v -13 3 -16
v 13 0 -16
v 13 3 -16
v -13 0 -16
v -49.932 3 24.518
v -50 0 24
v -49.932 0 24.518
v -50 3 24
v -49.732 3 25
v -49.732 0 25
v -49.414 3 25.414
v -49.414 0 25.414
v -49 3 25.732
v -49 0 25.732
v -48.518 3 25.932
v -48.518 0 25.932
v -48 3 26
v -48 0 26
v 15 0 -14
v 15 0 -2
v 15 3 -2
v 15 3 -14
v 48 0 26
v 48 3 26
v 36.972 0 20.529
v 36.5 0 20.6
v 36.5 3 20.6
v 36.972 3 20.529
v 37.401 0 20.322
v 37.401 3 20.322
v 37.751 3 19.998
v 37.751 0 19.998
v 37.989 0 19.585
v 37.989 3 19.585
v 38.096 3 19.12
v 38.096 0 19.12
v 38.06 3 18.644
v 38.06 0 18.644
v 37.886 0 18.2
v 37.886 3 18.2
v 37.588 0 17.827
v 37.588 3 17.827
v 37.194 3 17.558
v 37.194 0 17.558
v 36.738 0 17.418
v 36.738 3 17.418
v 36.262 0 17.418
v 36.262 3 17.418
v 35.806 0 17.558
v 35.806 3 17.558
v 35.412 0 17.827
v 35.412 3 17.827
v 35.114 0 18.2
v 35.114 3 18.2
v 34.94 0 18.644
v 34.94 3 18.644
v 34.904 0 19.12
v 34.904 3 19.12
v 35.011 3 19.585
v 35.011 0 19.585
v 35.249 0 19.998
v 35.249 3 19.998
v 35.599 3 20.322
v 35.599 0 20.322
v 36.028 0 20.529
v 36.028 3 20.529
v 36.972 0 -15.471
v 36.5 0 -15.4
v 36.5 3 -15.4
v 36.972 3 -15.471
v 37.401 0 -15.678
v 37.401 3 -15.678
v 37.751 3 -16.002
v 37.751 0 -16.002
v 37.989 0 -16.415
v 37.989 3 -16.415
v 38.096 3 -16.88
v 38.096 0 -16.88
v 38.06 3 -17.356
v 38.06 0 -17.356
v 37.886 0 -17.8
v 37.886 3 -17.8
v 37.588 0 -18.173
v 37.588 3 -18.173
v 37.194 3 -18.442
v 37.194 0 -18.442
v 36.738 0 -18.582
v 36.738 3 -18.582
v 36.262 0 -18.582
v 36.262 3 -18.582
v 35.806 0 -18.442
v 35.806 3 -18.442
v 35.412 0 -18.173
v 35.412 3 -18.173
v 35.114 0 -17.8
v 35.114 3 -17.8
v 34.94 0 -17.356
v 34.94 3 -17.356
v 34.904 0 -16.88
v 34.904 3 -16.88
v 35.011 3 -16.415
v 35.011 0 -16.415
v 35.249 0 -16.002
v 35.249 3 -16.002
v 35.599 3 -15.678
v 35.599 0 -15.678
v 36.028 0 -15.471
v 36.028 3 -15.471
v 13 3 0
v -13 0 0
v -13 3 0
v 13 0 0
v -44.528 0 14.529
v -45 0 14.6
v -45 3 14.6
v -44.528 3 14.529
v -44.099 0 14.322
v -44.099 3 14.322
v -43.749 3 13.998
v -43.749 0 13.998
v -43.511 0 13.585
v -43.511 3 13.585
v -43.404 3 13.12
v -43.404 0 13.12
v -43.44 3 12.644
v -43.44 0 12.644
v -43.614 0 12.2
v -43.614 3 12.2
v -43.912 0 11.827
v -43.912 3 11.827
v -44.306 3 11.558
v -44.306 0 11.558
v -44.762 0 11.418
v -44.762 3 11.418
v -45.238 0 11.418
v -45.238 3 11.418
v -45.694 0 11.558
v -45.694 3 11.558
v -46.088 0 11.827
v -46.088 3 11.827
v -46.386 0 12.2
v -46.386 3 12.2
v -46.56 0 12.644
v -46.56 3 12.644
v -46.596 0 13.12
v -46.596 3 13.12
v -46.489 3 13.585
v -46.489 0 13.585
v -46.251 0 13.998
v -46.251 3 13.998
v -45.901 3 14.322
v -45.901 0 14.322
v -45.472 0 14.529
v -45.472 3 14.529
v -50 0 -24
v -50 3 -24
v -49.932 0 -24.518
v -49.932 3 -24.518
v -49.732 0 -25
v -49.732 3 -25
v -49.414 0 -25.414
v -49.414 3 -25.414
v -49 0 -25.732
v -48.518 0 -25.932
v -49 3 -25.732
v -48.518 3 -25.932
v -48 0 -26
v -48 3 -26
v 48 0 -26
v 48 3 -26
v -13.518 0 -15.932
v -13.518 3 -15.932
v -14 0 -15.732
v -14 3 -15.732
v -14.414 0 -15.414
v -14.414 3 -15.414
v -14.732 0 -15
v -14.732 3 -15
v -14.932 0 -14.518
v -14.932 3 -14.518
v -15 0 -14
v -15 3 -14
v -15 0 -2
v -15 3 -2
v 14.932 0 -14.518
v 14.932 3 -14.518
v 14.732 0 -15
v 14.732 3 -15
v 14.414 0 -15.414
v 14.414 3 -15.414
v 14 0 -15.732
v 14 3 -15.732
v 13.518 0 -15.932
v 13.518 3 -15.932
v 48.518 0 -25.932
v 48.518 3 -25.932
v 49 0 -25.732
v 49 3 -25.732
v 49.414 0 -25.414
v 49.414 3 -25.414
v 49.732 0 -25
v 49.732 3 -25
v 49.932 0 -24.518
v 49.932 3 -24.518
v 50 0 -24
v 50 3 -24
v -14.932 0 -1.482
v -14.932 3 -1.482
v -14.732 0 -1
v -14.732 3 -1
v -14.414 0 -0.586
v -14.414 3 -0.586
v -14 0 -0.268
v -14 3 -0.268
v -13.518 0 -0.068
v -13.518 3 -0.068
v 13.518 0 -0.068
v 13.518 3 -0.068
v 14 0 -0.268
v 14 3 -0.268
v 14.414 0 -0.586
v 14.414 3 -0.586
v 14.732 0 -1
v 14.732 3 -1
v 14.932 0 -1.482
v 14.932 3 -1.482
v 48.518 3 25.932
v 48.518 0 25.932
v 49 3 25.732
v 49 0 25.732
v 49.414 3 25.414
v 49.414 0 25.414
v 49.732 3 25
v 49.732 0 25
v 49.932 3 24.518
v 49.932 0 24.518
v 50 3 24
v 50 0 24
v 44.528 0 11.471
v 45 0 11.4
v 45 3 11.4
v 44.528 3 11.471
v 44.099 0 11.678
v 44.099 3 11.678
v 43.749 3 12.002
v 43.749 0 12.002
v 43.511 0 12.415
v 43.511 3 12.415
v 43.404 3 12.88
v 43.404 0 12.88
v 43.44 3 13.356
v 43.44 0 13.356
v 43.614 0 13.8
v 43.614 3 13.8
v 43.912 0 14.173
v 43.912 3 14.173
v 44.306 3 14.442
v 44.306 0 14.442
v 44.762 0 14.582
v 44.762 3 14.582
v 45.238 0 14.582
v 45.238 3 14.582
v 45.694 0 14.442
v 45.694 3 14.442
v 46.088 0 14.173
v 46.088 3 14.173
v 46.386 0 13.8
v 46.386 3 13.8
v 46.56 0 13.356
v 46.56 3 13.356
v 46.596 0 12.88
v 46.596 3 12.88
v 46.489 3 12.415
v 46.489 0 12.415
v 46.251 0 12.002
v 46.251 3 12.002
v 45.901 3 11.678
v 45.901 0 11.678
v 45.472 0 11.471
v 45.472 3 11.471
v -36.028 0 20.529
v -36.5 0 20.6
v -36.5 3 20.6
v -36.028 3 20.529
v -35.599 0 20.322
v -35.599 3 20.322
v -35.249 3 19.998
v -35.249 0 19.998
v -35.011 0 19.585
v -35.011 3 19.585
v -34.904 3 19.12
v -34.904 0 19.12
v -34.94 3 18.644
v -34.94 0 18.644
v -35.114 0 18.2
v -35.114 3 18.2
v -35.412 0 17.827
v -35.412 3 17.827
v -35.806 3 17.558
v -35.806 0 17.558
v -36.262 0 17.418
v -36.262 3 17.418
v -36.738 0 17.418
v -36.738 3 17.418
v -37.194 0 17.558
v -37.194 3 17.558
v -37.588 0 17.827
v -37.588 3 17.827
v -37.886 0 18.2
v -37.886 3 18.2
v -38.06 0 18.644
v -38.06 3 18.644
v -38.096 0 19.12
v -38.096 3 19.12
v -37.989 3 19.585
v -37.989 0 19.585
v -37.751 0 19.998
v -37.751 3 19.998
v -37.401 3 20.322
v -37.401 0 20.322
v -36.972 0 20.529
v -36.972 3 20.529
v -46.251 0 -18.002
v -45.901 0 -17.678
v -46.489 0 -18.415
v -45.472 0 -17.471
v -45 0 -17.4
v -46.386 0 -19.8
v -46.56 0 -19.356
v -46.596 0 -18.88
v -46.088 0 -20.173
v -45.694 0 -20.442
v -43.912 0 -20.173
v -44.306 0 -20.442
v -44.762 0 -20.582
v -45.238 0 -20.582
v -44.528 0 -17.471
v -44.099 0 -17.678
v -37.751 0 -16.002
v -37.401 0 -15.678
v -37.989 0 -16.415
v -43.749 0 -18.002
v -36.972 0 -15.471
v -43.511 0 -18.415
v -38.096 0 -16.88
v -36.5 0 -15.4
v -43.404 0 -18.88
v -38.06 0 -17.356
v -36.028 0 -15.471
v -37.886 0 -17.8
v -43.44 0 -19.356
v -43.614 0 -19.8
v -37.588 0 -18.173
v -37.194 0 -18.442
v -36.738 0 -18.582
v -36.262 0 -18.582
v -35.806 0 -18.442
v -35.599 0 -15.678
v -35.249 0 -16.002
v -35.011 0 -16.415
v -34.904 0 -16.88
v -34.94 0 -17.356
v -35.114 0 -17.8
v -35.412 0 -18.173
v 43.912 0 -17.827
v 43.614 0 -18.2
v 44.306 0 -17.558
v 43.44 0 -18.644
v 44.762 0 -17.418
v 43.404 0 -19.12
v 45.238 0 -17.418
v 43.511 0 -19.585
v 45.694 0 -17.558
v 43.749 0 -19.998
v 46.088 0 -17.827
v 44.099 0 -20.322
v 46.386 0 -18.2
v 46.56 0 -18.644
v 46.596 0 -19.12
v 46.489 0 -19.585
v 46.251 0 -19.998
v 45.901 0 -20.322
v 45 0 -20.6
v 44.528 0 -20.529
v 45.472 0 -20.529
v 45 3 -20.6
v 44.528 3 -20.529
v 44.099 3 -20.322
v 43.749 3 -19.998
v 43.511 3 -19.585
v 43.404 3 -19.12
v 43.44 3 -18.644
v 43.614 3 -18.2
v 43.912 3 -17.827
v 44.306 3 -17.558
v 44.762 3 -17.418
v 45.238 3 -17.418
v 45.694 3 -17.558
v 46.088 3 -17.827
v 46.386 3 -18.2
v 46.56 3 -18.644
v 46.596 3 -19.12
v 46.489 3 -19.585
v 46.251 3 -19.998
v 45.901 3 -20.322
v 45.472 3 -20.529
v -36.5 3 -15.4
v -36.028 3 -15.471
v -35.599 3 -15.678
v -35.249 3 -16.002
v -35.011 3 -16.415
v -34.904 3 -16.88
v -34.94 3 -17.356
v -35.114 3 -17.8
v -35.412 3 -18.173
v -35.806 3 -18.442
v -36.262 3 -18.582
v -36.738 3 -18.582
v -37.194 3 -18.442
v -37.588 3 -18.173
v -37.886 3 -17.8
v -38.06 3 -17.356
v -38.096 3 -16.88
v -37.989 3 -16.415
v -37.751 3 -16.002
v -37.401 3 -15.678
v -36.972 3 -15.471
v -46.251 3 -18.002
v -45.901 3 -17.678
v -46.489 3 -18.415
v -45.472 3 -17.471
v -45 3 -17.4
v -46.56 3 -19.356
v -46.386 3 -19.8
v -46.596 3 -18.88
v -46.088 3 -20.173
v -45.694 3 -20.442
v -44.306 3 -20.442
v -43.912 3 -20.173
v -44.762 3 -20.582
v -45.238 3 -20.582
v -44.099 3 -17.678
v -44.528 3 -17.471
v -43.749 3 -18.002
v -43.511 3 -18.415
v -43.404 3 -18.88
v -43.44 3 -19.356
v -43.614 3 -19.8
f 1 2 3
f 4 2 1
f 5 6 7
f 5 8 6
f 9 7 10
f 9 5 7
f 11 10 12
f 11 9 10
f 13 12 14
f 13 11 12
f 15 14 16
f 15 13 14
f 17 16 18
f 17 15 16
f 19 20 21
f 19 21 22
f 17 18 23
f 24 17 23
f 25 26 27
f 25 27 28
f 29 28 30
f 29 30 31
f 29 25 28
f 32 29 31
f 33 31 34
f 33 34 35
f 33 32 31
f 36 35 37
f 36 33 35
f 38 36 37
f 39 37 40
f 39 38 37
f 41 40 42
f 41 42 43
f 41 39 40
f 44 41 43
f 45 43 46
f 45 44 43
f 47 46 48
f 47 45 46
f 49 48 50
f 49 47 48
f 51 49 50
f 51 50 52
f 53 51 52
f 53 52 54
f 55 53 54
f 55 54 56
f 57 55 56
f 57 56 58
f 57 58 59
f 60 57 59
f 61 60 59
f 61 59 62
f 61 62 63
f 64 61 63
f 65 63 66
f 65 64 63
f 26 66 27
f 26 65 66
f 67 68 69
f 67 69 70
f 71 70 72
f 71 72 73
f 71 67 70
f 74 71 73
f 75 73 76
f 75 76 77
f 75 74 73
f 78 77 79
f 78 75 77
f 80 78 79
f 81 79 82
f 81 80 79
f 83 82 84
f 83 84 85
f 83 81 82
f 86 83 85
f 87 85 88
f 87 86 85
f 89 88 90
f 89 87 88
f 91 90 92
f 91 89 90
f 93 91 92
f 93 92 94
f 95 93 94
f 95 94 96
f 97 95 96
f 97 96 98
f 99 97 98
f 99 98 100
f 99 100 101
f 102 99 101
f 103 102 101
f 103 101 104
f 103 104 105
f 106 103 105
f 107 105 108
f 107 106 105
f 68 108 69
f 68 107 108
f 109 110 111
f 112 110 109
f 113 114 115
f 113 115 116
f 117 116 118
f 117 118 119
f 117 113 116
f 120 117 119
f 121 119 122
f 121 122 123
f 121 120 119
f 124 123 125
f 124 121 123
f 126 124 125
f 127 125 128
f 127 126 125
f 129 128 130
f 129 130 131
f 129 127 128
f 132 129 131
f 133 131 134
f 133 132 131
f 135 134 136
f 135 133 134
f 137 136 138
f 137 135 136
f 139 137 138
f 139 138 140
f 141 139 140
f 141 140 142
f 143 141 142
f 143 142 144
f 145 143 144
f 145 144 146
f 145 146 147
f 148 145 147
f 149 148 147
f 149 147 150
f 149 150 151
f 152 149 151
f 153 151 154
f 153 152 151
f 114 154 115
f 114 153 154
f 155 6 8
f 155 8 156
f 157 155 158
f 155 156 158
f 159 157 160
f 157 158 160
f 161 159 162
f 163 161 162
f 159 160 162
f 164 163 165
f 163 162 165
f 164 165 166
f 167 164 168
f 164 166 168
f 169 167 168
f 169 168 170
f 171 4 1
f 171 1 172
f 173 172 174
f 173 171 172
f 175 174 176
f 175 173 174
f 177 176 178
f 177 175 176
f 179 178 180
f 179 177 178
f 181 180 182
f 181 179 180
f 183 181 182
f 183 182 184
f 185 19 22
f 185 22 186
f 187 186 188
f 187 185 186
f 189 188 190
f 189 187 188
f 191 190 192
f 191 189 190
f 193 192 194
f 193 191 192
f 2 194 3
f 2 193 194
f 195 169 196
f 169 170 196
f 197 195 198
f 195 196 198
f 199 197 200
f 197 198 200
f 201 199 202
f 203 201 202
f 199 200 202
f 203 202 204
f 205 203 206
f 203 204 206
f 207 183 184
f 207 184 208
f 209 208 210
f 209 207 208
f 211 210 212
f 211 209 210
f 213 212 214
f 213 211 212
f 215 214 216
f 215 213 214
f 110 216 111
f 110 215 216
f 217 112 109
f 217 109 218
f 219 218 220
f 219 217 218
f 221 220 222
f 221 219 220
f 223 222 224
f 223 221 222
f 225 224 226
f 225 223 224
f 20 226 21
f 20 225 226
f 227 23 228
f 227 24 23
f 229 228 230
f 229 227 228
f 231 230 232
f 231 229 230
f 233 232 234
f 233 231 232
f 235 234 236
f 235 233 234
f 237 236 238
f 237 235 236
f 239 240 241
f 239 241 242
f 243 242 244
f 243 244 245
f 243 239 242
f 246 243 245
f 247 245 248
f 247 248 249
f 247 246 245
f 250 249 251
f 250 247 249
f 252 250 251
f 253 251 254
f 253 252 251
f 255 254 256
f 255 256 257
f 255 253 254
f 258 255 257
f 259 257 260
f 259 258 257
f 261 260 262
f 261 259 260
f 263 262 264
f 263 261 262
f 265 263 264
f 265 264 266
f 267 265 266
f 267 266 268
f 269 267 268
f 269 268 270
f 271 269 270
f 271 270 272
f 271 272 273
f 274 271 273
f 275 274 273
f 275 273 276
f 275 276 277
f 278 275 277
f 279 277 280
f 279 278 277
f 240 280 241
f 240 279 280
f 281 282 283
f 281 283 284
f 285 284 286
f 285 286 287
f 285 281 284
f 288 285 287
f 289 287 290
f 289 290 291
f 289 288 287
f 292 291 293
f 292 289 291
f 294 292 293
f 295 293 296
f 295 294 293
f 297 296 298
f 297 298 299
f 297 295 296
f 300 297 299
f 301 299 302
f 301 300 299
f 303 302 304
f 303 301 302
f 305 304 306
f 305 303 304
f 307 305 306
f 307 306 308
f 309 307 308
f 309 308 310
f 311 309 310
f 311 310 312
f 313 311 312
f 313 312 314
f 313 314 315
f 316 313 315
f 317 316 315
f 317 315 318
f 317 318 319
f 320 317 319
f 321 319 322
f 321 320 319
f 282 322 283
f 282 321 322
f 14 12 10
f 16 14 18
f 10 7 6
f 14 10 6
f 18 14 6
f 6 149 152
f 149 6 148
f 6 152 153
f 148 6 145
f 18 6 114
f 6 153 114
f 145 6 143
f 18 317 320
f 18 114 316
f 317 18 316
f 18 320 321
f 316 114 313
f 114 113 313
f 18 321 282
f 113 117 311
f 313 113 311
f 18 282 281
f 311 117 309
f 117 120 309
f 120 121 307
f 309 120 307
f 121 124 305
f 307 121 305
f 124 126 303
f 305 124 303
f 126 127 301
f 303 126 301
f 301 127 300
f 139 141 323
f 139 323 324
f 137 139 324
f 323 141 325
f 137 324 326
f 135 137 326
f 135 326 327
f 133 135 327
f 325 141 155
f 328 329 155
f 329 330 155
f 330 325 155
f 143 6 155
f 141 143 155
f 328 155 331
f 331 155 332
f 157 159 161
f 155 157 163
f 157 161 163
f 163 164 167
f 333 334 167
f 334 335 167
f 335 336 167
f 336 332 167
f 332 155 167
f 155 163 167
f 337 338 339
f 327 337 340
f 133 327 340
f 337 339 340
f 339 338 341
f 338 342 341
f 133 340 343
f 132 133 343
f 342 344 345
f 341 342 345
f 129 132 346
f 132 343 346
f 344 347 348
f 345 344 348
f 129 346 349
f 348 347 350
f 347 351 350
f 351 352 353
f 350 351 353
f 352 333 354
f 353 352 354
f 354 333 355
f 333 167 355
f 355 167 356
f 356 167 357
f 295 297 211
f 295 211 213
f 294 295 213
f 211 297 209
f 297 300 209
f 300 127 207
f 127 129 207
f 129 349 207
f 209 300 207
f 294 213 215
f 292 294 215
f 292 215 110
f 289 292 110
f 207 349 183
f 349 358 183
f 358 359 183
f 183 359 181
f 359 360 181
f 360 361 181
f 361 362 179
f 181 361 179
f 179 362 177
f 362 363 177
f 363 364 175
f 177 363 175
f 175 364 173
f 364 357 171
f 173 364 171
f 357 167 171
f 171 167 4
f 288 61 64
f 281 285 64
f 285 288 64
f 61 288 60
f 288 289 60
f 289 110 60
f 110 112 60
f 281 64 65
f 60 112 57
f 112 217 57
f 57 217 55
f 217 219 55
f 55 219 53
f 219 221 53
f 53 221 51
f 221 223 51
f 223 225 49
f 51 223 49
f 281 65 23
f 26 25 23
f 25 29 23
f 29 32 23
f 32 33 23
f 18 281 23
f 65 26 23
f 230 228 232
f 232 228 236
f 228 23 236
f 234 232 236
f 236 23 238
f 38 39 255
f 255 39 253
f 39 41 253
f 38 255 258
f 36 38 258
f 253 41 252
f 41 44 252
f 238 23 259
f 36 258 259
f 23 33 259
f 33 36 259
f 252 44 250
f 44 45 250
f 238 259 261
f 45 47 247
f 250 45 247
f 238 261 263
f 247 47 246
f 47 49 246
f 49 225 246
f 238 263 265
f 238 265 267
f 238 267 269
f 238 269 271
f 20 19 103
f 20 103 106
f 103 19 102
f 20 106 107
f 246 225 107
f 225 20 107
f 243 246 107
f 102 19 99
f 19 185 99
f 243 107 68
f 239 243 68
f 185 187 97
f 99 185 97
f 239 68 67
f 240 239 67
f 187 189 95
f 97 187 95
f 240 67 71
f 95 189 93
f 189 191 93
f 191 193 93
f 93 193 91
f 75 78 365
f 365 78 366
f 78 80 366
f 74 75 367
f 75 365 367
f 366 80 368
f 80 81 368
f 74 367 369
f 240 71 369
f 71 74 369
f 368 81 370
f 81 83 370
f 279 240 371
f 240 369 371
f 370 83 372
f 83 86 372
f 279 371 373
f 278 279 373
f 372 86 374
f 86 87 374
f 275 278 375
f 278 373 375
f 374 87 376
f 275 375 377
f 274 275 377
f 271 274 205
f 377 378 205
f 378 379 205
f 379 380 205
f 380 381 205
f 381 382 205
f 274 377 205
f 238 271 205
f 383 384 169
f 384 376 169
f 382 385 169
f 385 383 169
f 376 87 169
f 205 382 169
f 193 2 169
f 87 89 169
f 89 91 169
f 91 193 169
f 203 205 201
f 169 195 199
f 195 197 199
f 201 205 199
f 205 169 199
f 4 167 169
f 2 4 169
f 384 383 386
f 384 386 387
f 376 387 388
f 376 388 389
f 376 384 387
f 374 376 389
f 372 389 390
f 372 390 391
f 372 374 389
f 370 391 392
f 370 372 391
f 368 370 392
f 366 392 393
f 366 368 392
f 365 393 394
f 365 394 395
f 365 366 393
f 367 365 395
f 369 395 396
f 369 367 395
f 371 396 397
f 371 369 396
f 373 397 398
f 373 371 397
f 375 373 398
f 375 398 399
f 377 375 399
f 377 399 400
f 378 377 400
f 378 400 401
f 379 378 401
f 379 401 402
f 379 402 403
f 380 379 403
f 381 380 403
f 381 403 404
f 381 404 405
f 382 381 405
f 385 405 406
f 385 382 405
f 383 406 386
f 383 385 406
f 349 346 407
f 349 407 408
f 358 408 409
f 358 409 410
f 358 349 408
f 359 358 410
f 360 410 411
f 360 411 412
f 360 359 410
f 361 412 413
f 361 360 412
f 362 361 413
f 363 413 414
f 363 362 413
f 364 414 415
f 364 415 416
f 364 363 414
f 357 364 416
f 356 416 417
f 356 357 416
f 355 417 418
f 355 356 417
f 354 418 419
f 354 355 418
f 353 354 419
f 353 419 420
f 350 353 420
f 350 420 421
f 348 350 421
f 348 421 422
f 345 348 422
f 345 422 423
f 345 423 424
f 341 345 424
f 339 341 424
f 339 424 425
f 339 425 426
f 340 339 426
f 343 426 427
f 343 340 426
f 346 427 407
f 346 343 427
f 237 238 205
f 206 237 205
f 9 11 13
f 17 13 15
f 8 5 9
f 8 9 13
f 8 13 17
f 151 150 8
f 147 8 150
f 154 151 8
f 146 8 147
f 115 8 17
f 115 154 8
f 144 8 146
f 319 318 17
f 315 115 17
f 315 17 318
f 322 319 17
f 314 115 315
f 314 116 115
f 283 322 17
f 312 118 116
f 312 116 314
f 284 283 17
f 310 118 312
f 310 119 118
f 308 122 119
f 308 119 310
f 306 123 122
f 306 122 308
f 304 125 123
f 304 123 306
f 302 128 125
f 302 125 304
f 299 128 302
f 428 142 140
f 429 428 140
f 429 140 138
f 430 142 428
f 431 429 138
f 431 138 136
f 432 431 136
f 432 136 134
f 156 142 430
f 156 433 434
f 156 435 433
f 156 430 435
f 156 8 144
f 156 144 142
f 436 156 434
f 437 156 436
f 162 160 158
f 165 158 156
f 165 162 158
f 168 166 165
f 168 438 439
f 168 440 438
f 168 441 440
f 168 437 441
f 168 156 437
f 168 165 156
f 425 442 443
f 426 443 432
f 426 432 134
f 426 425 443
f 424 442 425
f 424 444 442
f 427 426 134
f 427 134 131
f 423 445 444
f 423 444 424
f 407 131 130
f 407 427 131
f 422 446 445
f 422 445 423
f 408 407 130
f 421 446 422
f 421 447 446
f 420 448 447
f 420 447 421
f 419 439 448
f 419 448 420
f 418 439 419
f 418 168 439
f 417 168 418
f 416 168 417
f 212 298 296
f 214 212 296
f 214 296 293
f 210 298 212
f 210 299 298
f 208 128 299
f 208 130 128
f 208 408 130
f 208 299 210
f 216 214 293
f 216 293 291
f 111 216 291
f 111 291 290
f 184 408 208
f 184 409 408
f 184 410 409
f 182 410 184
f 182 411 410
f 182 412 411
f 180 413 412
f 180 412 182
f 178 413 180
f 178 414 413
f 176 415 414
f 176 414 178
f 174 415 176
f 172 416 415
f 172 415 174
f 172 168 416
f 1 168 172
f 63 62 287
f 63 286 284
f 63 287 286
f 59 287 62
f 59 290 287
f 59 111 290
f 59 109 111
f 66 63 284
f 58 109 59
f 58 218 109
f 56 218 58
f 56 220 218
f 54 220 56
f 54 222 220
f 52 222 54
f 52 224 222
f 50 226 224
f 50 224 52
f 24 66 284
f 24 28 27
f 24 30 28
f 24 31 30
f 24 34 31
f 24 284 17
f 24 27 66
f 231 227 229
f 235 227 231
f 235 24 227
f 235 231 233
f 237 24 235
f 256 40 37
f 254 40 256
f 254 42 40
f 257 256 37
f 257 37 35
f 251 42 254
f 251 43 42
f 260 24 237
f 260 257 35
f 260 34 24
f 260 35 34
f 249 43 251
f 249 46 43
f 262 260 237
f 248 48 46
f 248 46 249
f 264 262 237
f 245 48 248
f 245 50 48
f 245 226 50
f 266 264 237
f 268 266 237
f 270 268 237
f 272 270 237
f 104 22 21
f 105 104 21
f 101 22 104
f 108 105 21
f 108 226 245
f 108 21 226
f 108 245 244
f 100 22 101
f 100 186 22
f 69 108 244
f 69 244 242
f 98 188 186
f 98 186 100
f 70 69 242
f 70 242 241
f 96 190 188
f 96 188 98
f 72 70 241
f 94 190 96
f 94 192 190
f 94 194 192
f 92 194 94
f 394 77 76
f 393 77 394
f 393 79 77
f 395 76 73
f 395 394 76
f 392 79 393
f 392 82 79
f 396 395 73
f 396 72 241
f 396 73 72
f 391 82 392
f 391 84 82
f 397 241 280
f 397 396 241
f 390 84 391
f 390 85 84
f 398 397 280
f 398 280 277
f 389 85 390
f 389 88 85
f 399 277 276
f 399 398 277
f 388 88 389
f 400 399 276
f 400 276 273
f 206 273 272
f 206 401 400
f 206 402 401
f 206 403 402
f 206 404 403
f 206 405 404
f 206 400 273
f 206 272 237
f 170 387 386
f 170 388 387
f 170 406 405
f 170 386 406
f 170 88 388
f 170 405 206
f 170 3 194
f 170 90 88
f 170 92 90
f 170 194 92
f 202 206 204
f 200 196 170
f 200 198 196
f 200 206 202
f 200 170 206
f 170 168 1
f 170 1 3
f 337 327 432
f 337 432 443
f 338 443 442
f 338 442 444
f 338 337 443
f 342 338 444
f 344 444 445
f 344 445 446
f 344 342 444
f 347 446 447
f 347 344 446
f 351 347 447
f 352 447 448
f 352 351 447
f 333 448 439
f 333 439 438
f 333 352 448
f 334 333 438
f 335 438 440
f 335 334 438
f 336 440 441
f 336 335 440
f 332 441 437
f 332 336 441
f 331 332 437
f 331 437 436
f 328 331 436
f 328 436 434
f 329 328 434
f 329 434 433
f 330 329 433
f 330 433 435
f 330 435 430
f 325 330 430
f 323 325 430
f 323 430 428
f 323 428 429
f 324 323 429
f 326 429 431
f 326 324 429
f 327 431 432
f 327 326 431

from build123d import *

# Parameters (mm, degrees)
SKETCH_1_W      = 100
SKETCH_1_H      = 52
SKETCH_1_R      = 1.6
EXTRUDE_1_DEPTH = 3
FILLET_1_R      = 2


with BuildPart() as part:
    # 草图1 → 凸台-拉伸1 (new body)
    with BuildSketch(Plane(origin=(0, 0, 0), x_dir=(1, 0, 0), z_dir=(0, 1, 0))):
        Rectangle(SKETCH_1_W, SKETCH_1_H)
        with Locations(Location((-36.5, 17, 0), (0, 0, 270))):
            Circle(SKETCH_1_R, mode=Mode.SUBTRACT)
        with Locations(Location((36.5, 17, 0), (0, 0, 270))):
            Circle(SKETCH_1_R, mode=Mode.SUBTRACT)
        with Locations(Location((36.5, -19, 0), (0, 0, 270))):
            Circle(SKETCH_1_R, mode=Mode.SUBTRACT)
        with Locations(Location((-36.5, -19, 0), (0, 0, 270))):
            Circle(SKETCH_1_R, mode=Mode.SUBTRACT)
        with Locations(Location((-45, 19, 0), (0, 0, 270))):
            Circle(SKETCH_1_R, mode=Mode.SUBTRACT)
        with Locations(Location((45, 19, 0), (0, 0, 90))):
            Circle(SKETCH_1_R, mode=Mode.SUBTRACT)
        with Locations(Location((-45, -13, 0), (0, 0, 270))):
            Circle(SKETCH_1_R, mode=Mode.SUBTRACT)
        with Locations(Location((45, -13, 0), (0, 0, 90))):
            Circle(SKETCH_1_R, mode=Mode.SUBTRACT)
        with BuildLine():
            Line((-13, 0), (13, 0))
            ThreePointArc((13, 0), (14.414213562, 0.585786438), (15, 2))
            Line((15, 2), (15, 14))
            ThreePointArc((15, 14), (14.414213562, 15.414213562), (13, 16))
            Line((13, 16), (-13, 16))
            ThreePointArc((-13, 16), (-14.414213562, 15.414213562), (-15, 14))
            Line((-15, 14), (-15, 2))
            ThreePointArc((-15, 2), (-14.414213562, 0.585786438), (-13, 0))
        make_face(mode=Mode.SUBTRACT)
    extrude(amount=EXTRUDE_1_DEPTH)

    # 圆角1
    fillet_1_edges = [part.edges().sort_by_distance(p)[0] for p in [
        (50, 1.5, 26),
        (-50, 1.5, 26),
        (-50, 1.5, -26),
        (50, 1.5, -26),
    ]]
    fillet(fillet_1_edges, radius=FILLET_1_R)


solid = part.part
